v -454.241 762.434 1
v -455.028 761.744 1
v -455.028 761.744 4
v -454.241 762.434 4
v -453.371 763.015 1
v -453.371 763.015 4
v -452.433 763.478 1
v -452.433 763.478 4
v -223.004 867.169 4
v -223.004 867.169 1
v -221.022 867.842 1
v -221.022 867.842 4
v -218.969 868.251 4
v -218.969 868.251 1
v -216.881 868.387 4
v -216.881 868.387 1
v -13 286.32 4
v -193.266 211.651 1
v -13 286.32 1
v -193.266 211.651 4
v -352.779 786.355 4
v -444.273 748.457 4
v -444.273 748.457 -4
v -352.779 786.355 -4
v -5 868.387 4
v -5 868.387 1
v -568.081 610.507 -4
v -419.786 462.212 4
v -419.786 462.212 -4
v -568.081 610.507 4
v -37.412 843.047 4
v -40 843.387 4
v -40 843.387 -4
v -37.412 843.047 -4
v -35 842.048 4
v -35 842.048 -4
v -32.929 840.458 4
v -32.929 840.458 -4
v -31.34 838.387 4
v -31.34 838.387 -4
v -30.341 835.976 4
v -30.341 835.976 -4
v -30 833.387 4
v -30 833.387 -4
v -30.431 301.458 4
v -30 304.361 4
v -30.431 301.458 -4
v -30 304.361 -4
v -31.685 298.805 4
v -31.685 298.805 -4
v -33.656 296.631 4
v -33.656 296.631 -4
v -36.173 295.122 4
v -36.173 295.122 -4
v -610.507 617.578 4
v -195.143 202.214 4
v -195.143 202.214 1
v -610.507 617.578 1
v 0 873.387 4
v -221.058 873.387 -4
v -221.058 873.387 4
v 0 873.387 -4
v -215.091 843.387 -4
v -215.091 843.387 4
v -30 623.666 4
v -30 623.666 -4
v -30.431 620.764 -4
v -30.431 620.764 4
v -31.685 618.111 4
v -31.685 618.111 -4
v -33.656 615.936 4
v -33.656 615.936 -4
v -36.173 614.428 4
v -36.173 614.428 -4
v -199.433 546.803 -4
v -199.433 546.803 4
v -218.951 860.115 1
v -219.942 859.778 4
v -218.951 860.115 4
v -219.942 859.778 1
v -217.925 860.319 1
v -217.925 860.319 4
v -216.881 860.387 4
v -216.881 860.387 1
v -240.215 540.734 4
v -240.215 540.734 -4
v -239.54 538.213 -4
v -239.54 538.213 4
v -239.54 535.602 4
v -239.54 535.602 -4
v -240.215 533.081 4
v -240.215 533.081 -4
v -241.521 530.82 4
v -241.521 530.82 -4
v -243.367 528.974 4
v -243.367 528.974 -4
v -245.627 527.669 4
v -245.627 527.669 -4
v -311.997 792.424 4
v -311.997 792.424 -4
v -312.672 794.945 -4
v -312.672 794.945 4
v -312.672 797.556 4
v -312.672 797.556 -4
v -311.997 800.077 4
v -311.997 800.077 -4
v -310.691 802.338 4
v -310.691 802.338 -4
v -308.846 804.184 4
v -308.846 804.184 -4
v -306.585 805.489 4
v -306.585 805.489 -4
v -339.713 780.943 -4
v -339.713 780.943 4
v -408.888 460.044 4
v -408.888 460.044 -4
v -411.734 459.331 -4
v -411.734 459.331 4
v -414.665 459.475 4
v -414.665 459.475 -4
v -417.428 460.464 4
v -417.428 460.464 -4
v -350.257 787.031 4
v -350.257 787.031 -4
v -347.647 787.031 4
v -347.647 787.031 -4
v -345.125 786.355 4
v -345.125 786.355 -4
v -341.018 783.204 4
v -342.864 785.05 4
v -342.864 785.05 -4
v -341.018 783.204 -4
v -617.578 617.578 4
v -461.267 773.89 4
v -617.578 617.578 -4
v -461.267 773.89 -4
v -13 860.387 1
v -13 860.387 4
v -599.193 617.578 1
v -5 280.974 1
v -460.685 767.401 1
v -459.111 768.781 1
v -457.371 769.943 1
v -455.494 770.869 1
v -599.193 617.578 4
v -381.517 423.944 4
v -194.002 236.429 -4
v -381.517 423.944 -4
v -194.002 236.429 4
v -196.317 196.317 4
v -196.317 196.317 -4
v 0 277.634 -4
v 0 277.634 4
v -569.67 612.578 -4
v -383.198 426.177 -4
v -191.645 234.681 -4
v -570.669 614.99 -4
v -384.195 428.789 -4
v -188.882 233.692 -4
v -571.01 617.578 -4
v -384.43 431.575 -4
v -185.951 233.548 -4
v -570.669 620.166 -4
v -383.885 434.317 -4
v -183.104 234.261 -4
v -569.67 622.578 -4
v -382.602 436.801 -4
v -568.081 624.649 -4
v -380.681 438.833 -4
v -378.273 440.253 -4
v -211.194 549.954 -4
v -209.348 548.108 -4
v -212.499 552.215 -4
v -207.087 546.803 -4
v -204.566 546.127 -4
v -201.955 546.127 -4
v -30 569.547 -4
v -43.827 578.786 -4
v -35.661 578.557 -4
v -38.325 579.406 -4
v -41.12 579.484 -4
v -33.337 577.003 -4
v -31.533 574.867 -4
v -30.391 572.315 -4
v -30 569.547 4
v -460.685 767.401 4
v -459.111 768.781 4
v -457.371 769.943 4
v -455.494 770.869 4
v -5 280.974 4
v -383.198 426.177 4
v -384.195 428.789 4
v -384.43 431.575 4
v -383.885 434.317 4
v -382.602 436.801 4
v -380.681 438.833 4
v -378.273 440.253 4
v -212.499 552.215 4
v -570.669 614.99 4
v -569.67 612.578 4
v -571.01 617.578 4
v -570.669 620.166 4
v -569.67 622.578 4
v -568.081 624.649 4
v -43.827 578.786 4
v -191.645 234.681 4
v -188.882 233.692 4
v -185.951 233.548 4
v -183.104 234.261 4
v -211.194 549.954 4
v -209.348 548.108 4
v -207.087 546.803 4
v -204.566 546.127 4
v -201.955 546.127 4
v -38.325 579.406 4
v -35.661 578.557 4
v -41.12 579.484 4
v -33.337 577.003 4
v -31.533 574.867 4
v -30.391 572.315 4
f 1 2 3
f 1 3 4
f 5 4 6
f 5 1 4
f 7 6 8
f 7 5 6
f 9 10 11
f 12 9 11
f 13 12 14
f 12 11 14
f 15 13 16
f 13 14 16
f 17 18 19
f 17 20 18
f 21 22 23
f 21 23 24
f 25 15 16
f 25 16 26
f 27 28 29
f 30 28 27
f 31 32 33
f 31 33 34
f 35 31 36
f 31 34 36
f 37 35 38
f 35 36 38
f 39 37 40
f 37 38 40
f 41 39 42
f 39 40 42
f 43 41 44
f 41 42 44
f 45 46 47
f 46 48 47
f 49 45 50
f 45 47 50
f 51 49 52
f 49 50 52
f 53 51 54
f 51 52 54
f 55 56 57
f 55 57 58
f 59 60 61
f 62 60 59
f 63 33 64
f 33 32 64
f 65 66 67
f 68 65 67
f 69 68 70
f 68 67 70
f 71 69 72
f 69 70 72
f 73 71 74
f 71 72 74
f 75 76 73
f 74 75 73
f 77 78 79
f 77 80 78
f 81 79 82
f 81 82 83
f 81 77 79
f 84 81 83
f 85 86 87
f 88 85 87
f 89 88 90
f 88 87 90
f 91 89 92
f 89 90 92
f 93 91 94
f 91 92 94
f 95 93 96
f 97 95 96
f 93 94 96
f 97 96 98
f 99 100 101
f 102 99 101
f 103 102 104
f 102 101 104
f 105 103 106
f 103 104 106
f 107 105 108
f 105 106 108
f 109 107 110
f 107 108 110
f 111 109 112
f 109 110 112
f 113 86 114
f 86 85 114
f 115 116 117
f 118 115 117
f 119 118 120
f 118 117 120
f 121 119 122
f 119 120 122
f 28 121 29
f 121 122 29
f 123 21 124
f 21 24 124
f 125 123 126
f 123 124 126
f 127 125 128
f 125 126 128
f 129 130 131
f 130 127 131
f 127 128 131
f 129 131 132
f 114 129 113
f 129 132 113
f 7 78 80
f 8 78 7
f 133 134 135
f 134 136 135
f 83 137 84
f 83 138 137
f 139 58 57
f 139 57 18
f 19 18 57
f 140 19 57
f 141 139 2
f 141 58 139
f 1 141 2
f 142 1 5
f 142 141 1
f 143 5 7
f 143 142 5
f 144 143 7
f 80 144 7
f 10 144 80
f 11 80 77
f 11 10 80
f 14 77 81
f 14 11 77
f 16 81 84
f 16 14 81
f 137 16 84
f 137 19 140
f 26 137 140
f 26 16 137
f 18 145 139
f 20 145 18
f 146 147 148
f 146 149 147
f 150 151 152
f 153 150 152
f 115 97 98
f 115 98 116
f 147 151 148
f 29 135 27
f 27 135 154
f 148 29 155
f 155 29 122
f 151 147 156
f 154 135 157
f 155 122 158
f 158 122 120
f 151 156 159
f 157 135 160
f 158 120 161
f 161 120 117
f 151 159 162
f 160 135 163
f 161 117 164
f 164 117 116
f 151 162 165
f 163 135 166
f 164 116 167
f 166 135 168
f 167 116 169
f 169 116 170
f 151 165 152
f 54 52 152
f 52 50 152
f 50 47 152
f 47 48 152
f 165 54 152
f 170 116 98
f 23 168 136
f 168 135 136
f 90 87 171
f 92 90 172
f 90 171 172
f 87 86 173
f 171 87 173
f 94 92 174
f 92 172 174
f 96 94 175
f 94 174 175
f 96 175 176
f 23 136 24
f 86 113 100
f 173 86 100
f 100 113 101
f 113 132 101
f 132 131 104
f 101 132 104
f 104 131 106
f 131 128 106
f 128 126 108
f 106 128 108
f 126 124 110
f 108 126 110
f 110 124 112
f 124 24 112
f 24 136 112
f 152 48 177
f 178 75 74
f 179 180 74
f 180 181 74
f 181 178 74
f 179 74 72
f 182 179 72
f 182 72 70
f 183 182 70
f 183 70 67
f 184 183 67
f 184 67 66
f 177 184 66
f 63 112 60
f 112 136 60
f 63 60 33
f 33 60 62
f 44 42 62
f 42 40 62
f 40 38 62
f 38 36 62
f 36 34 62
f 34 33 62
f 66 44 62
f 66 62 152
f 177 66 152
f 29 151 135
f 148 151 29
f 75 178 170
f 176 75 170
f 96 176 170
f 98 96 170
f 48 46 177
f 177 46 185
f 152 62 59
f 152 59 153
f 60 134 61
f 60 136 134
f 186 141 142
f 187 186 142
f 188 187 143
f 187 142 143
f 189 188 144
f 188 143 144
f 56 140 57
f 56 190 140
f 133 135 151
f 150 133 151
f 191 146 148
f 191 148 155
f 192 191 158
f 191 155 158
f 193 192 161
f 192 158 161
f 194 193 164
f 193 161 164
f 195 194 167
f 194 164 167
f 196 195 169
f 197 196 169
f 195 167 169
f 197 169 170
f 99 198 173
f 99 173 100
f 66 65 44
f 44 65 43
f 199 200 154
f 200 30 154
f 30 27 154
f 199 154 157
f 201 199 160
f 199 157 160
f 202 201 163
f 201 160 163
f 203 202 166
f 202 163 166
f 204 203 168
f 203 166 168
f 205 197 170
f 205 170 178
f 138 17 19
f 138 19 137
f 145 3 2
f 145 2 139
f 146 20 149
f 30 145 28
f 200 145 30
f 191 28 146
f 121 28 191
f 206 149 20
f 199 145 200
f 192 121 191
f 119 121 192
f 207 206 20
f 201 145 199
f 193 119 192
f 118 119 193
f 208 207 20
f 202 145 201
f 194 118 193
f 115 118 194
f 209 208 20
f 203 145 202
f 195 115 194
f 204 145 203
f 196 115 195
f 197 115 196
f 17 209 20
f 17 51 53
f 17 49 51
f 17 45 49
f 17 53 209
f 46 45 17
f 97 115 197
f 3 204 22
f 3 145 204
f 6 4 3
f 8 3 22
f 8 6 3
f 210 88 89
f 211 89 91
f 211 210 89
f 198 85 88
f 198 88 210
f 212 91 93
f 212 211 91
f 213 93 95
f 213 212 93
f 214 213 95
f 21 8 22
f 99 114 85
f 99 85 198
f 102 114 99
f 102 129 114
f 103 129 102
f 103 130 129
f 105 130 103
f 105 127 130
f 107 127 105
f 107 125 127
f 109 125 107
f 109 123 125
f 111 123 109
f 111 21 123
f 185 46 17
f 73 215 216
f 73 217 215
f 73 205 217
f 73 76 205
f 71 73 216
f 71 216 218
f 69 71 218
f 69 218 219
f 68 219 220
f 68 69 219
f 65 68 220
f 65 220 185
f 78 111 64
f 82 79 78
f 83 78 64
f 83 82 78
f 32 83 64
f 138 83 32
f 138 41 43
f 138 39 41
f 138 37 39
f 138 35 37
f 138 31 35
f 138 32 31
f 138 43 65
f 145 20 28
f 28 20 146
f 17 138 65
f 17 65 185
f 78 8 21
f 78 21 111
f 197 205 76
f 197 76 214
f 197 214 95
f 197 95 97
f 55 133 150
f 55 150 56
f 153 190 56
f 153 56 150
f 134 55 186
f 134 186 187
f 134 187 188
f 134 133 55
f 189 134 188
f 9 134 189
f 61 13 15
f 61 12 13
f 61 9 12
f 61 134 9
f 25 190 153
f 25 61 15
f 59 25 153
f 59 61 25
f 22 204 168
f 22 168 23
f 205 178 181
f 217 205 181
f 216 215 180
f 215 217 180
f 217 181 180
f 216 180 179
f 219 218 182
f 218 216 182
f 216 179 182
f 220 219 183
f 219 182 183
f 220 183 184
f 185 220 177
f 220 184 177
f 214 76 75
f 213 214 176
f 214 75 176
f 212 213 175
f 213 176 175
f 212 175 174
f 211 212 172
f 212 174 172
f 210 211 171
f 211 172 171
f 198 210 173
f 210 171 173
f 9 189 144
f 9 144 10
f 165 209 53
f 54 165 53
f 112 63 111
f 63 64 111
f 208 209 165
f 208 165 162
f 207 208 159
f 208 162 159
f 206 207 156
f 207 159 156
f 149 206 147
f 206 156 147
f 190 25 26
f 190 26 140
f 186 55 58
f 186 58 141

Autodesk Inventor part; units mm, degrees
ref_plane "YZ Plane" through (0, 0, 0) normal (1, 0, 0) x (0, 1, 0)
ref_plane "XZ Plane" through (0, 0, 0) normal (0, 1, 0) x (-1, 0, 0)
ref_plane "XY Plane" through (0, 0, 0) normal (0, 0, 1) x (1, 0, 0)
sketch "Sketch1" plane through (0, 0, 0) normal (0, 0, 1) x (1, 0, 0)
  line L0 (0, 277.6336) -> (196.3166, 196.3166) construction
  line L1 (196.3166, 196.3166) -> (277.6336, 0) construction
  line L2 (277.6336, 0) -> (196.3166, -196.3166) construction
  line L3 (196.3166, -196.3166) -> (0, -277.6336) construction
  line L4 (0, -277.6336) -> (-196.3166, -196.3166) construction
  line L5 (-196.3166, -196.3166) -> (-277.6336, 0) construction
  line L6 (-277.6336, 0) -> (-196.3166, 196.3166) construction
  line L7 (-196.3166, 196.3166) -> (0, 277.6336)
  line L8 (-196.3166, 196.3166) -> (0, 277.6336)
  line L9 (-461.2666, 773.8898) -> (-221.0579, 873.3874)
  line L10 (-98.1583, 236.9751) -> (-341.1623, 823.6386) construction
  line L11 (-221.0579, 873.3874) -> (0, 873.3874)
  line L12 (0, 873.3874) -> (0, 277.6336)
  line L13 (-461.2666, 773.8898) -> (-617.5782, 617.5782)
  line L14 (-617.5782, 617.5782) -> (-196.3166, 196.3166)
  point P0 (0, 0)
  point P1 (0, 0)
  dimension "d0" = 513
  dimension "d2" = 260
  dimension "d3" = 635
extrude "Extrusion1" add sketch "Sketch1" along normal mid plane 8
sketch "Sketch2" plane through (0, 0, 4) normal (0, 0, 1) x (1, 0, 0)
  line L0 (-221.0579, 873.3874) -> (-461.2666, 773.8898) projected
  line L1 (-461.2666, 773.8898) -> (-617.5782, 617.5782) projected
  line L2 (-236.3886, 531.4957) -> (-415.0608, 457.4872)
  line L3 (-196.3166, 196.3166) -> (0, 277.6336) projected
  line L4 (-98.1583, 236.9751) -> (-341.1623, 823.6386) construction
  line L5 (-617.5782, 617.5782) -> (-196.3166, 196.3166) projected
  line L6 (-415.0608, 457.4872) -> (-575.1518, 617.5782)
  line L7 (-575.1518, 617.5782) -> (-444.273, 748.457)
  line L8 (-444.273, 748.457) -> (-343.54, 790.182)
  line L9 (-236.3886, 531.4957) -> (-343.54, 790.182)
  line L10 (-208.6722, 542.9762) -> (-30, 616.9847)
  line L11 (-30, 616.9847) -> (-30, 843.3874)
  line L12 (-30, 843.3874) -> (-215.0906, 843.3874)
  line L13 (-215.0906, 843.3874) -> (-315.8236, 801.6625)
  line L14 (-208.6722, 542.9762) -> (-315.8236, 801.6625)
  line L15 (0, 277.6336) -> (0, 873.3874) projected
  line L16 (-415.0608, 457.4872) -> (-30, 616.9847) construction
  line L17 (-392.0998, 434.5262) -> (-30, 584.5129)
  line L18 (-189.2776, 231.704) -> (-30, 297.679)
  line L19 (-30, 297.679) -> (-30, 584.5129)
  line L20 (-189.2776, 231.704) -> (-392.0998, 434.5262)
  point P0 (0, 0)
  dimension "d11" = 30
  dimension "d12" = 280
  dimension "d13" = 30
  dimension "d14" = 30
  dimension "d15" = 15
  dimension "d21" = 30
  dimension "d22" = 30
  dimension "d23" = 30
  dimension "d24" = 30
extrude "Extrusion2" cut sketch "Sketch2" against normal up to surface (8 mm away)
fillet "Fillet1" radius 10 12 edges at (-575.1518, 617.5782, 0) (-343.54, 790.182, 0) (-236.3886, 531.4957, 0) (-415.0608, 457.4872, 0) (-315.8236, 801.6625, 0) (-30, 843.3874, 0) (-30, 616.9847, 0) (-208.6722, 542.9762, 0) (-392.0998, 434.5262, 0) (-30, 584.5129, 0) (-30, 297.679, 0) (-189.2776, 231.704, 0)
sketch "Sketch4" plane through (0, 0, 4) normal (0, 0, 1) x (1, 0, 0)
  line L0 (-221.0579, 873.3874) -> (-461.2666, 773.8898) projected
  line L1 (0, 873.3874) -> (-221.0579, 873.3874) projected
  line L2 (-461.2666, 773.8898) -> (-617.5782, 617.5782) projected
  line L3 (-617.5782, 617.5782) -> (-196.3166, 196.3166) projected
  line L4 (-196.3166, 196.3166) -> (0, 277.6336) projected
  line L5 (0, 277.6336) -> (0, 873.3874) projected
  line L6 (-458.4343, 769.651) -> (-220.0634, 868.3874)
  line L7 (-220.0634, 868.3874) -> (-5, 868.3874)
  line L8 (-5, 868.3874) -> (-5, 280.9745)
  line L9 (-5, 280.9745) -> (-195.1434, 202.2145)
  line L10 (-195.1434, 202.2145) -> (-610.5071, 617.5782)
  line L11 (-610.5071, 617.5782) -> (-458.4343, 769.651)
  line L12 (-218.4721, 860.3874) -> (-453.9027, 762.8689)
  line L13 (-453.9027, 762.8689) -> (-599.1934, 617.5782)
  line L14 (-599.1934, 617.5782) -> (-193.2664, 211.6511)
  line L15 (-193.2664, 211.6511) -> (-13, 286.3199)
  line L16 (-13, 286.3199) -> (-13, 860.3874)
  line L17 (-13, 860.3874) -> (-218.4721, 860.3874)
  point P0 (0, 0)
  dimension "d26" = 5
  dimension "d27" = 8
extrude "Extrusion3" cut sketch "Sketch4" against normal blind 3 contours L6 L7 L8 L9 L10 L11
fillet "Fillet3" radius 16 2 edges at (-220.0634, 868.3874, 2.5) (-458.4343, 769.651, 2.5)
fillet "Fillet4" radius 8 2 edges at (-453.9027, 762.8689, 2.5) (-218.4721, 860.3874, 2.5)
equation "\"d0\" = Барабан_габарит_по_кассетам"
equation "\"d2\" = Кассета_длина_грани"
equation "\"d3\" = Кассета_высота"
equation "\"d11\" = d13"
equation "\"d14\" = d13"
equation "\"d15\" = 0.5 * d13"
equation "\"d21\" = d13"
equation "\"d22\" = d13"
equation "\"d23\" = d13"
equation "\"d24\" = d13"
equation "\"Барабан_габарит_по_кассетам\" = 513"
equation "\"Кассета_длина_грани\" = 260"
equation "\"Кассета_высота\" = 635"
properties part number "ДМФ 01 51 Внешняя рамка"
